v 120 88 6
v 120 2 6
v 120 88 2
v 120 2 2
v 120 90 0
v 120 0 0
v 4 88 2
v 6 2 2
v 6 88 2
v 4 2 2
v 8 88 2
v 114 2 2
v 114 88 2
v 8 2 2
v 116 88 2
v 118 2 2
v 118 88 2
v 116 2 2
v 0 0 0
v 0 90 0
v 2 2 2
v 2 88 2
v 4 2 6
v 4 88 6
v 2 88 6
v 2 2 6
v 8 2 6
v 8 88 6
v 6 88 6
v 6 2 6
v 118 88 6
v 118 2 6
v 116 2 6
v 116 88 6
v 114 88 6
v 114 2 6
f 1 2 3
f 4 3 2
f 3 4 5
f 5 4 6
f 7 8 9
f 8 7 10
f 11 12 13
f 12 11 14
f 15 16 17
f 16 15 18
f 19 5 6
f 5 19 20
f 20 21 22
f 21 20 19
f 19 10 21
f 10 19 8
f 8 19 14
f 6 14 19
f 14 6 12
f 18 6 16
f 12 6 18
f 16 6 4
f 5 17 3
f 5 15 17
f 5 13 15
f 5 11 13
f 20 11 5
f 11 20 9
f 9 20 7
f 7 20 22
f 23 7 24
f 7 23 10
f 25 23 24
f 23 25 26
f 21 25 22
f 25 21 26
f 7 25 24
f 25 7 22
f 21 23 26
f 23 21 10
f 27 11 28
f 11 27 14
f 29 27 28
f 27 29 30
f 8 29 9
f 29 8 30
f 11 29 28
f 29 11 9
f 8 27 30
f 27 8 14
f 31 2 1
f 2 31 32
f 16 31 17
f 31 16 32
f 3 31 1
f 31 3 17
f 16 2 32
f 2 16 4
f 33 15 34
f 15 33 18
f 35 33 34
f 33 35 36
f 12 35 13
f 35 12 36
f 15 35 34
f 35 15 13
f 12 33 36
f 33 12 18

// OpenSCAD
x=120;  // height
y=90;   // width
t=2;    // thickness

difference() {
    cube(size=[x, y, t], center=false);
    // upper bound
    rotate([0, -1*45, 0]) {
        translate([0, 0, 0]) {
            cube(size=[x, y, t], center=false);
        }
    }
    // left bound
    rotate([45, 0, 0]) {
        translate([-0.5, 0, 0]) {
            cube(size=[x+1, y, t], center=false);
        }
    }
    // right bound
    translate([0, y, 0]) {
        rotate([1*45, 0, 0]) {
            translate([-0.5, 0, 0]) {
                cube(size=[x+1, y, 3*t], center=false);
            }
        }
    }
}
translate([t, t, 0]) {
    cube(size=[t, y-2*t, 3*t], center=false);
}
translate([3*t, t, 0]) {
    cube(size=[t, y-2*t, 3*t], center=false);
}
translate([x-t, t, 0]) {
    cube(size=[t, y-2*t, 3*t], center=false);
}
translate([x-3*t, t, 0]) {
    cube(size=[t, y-2*t, 3*t], center=false);
}
